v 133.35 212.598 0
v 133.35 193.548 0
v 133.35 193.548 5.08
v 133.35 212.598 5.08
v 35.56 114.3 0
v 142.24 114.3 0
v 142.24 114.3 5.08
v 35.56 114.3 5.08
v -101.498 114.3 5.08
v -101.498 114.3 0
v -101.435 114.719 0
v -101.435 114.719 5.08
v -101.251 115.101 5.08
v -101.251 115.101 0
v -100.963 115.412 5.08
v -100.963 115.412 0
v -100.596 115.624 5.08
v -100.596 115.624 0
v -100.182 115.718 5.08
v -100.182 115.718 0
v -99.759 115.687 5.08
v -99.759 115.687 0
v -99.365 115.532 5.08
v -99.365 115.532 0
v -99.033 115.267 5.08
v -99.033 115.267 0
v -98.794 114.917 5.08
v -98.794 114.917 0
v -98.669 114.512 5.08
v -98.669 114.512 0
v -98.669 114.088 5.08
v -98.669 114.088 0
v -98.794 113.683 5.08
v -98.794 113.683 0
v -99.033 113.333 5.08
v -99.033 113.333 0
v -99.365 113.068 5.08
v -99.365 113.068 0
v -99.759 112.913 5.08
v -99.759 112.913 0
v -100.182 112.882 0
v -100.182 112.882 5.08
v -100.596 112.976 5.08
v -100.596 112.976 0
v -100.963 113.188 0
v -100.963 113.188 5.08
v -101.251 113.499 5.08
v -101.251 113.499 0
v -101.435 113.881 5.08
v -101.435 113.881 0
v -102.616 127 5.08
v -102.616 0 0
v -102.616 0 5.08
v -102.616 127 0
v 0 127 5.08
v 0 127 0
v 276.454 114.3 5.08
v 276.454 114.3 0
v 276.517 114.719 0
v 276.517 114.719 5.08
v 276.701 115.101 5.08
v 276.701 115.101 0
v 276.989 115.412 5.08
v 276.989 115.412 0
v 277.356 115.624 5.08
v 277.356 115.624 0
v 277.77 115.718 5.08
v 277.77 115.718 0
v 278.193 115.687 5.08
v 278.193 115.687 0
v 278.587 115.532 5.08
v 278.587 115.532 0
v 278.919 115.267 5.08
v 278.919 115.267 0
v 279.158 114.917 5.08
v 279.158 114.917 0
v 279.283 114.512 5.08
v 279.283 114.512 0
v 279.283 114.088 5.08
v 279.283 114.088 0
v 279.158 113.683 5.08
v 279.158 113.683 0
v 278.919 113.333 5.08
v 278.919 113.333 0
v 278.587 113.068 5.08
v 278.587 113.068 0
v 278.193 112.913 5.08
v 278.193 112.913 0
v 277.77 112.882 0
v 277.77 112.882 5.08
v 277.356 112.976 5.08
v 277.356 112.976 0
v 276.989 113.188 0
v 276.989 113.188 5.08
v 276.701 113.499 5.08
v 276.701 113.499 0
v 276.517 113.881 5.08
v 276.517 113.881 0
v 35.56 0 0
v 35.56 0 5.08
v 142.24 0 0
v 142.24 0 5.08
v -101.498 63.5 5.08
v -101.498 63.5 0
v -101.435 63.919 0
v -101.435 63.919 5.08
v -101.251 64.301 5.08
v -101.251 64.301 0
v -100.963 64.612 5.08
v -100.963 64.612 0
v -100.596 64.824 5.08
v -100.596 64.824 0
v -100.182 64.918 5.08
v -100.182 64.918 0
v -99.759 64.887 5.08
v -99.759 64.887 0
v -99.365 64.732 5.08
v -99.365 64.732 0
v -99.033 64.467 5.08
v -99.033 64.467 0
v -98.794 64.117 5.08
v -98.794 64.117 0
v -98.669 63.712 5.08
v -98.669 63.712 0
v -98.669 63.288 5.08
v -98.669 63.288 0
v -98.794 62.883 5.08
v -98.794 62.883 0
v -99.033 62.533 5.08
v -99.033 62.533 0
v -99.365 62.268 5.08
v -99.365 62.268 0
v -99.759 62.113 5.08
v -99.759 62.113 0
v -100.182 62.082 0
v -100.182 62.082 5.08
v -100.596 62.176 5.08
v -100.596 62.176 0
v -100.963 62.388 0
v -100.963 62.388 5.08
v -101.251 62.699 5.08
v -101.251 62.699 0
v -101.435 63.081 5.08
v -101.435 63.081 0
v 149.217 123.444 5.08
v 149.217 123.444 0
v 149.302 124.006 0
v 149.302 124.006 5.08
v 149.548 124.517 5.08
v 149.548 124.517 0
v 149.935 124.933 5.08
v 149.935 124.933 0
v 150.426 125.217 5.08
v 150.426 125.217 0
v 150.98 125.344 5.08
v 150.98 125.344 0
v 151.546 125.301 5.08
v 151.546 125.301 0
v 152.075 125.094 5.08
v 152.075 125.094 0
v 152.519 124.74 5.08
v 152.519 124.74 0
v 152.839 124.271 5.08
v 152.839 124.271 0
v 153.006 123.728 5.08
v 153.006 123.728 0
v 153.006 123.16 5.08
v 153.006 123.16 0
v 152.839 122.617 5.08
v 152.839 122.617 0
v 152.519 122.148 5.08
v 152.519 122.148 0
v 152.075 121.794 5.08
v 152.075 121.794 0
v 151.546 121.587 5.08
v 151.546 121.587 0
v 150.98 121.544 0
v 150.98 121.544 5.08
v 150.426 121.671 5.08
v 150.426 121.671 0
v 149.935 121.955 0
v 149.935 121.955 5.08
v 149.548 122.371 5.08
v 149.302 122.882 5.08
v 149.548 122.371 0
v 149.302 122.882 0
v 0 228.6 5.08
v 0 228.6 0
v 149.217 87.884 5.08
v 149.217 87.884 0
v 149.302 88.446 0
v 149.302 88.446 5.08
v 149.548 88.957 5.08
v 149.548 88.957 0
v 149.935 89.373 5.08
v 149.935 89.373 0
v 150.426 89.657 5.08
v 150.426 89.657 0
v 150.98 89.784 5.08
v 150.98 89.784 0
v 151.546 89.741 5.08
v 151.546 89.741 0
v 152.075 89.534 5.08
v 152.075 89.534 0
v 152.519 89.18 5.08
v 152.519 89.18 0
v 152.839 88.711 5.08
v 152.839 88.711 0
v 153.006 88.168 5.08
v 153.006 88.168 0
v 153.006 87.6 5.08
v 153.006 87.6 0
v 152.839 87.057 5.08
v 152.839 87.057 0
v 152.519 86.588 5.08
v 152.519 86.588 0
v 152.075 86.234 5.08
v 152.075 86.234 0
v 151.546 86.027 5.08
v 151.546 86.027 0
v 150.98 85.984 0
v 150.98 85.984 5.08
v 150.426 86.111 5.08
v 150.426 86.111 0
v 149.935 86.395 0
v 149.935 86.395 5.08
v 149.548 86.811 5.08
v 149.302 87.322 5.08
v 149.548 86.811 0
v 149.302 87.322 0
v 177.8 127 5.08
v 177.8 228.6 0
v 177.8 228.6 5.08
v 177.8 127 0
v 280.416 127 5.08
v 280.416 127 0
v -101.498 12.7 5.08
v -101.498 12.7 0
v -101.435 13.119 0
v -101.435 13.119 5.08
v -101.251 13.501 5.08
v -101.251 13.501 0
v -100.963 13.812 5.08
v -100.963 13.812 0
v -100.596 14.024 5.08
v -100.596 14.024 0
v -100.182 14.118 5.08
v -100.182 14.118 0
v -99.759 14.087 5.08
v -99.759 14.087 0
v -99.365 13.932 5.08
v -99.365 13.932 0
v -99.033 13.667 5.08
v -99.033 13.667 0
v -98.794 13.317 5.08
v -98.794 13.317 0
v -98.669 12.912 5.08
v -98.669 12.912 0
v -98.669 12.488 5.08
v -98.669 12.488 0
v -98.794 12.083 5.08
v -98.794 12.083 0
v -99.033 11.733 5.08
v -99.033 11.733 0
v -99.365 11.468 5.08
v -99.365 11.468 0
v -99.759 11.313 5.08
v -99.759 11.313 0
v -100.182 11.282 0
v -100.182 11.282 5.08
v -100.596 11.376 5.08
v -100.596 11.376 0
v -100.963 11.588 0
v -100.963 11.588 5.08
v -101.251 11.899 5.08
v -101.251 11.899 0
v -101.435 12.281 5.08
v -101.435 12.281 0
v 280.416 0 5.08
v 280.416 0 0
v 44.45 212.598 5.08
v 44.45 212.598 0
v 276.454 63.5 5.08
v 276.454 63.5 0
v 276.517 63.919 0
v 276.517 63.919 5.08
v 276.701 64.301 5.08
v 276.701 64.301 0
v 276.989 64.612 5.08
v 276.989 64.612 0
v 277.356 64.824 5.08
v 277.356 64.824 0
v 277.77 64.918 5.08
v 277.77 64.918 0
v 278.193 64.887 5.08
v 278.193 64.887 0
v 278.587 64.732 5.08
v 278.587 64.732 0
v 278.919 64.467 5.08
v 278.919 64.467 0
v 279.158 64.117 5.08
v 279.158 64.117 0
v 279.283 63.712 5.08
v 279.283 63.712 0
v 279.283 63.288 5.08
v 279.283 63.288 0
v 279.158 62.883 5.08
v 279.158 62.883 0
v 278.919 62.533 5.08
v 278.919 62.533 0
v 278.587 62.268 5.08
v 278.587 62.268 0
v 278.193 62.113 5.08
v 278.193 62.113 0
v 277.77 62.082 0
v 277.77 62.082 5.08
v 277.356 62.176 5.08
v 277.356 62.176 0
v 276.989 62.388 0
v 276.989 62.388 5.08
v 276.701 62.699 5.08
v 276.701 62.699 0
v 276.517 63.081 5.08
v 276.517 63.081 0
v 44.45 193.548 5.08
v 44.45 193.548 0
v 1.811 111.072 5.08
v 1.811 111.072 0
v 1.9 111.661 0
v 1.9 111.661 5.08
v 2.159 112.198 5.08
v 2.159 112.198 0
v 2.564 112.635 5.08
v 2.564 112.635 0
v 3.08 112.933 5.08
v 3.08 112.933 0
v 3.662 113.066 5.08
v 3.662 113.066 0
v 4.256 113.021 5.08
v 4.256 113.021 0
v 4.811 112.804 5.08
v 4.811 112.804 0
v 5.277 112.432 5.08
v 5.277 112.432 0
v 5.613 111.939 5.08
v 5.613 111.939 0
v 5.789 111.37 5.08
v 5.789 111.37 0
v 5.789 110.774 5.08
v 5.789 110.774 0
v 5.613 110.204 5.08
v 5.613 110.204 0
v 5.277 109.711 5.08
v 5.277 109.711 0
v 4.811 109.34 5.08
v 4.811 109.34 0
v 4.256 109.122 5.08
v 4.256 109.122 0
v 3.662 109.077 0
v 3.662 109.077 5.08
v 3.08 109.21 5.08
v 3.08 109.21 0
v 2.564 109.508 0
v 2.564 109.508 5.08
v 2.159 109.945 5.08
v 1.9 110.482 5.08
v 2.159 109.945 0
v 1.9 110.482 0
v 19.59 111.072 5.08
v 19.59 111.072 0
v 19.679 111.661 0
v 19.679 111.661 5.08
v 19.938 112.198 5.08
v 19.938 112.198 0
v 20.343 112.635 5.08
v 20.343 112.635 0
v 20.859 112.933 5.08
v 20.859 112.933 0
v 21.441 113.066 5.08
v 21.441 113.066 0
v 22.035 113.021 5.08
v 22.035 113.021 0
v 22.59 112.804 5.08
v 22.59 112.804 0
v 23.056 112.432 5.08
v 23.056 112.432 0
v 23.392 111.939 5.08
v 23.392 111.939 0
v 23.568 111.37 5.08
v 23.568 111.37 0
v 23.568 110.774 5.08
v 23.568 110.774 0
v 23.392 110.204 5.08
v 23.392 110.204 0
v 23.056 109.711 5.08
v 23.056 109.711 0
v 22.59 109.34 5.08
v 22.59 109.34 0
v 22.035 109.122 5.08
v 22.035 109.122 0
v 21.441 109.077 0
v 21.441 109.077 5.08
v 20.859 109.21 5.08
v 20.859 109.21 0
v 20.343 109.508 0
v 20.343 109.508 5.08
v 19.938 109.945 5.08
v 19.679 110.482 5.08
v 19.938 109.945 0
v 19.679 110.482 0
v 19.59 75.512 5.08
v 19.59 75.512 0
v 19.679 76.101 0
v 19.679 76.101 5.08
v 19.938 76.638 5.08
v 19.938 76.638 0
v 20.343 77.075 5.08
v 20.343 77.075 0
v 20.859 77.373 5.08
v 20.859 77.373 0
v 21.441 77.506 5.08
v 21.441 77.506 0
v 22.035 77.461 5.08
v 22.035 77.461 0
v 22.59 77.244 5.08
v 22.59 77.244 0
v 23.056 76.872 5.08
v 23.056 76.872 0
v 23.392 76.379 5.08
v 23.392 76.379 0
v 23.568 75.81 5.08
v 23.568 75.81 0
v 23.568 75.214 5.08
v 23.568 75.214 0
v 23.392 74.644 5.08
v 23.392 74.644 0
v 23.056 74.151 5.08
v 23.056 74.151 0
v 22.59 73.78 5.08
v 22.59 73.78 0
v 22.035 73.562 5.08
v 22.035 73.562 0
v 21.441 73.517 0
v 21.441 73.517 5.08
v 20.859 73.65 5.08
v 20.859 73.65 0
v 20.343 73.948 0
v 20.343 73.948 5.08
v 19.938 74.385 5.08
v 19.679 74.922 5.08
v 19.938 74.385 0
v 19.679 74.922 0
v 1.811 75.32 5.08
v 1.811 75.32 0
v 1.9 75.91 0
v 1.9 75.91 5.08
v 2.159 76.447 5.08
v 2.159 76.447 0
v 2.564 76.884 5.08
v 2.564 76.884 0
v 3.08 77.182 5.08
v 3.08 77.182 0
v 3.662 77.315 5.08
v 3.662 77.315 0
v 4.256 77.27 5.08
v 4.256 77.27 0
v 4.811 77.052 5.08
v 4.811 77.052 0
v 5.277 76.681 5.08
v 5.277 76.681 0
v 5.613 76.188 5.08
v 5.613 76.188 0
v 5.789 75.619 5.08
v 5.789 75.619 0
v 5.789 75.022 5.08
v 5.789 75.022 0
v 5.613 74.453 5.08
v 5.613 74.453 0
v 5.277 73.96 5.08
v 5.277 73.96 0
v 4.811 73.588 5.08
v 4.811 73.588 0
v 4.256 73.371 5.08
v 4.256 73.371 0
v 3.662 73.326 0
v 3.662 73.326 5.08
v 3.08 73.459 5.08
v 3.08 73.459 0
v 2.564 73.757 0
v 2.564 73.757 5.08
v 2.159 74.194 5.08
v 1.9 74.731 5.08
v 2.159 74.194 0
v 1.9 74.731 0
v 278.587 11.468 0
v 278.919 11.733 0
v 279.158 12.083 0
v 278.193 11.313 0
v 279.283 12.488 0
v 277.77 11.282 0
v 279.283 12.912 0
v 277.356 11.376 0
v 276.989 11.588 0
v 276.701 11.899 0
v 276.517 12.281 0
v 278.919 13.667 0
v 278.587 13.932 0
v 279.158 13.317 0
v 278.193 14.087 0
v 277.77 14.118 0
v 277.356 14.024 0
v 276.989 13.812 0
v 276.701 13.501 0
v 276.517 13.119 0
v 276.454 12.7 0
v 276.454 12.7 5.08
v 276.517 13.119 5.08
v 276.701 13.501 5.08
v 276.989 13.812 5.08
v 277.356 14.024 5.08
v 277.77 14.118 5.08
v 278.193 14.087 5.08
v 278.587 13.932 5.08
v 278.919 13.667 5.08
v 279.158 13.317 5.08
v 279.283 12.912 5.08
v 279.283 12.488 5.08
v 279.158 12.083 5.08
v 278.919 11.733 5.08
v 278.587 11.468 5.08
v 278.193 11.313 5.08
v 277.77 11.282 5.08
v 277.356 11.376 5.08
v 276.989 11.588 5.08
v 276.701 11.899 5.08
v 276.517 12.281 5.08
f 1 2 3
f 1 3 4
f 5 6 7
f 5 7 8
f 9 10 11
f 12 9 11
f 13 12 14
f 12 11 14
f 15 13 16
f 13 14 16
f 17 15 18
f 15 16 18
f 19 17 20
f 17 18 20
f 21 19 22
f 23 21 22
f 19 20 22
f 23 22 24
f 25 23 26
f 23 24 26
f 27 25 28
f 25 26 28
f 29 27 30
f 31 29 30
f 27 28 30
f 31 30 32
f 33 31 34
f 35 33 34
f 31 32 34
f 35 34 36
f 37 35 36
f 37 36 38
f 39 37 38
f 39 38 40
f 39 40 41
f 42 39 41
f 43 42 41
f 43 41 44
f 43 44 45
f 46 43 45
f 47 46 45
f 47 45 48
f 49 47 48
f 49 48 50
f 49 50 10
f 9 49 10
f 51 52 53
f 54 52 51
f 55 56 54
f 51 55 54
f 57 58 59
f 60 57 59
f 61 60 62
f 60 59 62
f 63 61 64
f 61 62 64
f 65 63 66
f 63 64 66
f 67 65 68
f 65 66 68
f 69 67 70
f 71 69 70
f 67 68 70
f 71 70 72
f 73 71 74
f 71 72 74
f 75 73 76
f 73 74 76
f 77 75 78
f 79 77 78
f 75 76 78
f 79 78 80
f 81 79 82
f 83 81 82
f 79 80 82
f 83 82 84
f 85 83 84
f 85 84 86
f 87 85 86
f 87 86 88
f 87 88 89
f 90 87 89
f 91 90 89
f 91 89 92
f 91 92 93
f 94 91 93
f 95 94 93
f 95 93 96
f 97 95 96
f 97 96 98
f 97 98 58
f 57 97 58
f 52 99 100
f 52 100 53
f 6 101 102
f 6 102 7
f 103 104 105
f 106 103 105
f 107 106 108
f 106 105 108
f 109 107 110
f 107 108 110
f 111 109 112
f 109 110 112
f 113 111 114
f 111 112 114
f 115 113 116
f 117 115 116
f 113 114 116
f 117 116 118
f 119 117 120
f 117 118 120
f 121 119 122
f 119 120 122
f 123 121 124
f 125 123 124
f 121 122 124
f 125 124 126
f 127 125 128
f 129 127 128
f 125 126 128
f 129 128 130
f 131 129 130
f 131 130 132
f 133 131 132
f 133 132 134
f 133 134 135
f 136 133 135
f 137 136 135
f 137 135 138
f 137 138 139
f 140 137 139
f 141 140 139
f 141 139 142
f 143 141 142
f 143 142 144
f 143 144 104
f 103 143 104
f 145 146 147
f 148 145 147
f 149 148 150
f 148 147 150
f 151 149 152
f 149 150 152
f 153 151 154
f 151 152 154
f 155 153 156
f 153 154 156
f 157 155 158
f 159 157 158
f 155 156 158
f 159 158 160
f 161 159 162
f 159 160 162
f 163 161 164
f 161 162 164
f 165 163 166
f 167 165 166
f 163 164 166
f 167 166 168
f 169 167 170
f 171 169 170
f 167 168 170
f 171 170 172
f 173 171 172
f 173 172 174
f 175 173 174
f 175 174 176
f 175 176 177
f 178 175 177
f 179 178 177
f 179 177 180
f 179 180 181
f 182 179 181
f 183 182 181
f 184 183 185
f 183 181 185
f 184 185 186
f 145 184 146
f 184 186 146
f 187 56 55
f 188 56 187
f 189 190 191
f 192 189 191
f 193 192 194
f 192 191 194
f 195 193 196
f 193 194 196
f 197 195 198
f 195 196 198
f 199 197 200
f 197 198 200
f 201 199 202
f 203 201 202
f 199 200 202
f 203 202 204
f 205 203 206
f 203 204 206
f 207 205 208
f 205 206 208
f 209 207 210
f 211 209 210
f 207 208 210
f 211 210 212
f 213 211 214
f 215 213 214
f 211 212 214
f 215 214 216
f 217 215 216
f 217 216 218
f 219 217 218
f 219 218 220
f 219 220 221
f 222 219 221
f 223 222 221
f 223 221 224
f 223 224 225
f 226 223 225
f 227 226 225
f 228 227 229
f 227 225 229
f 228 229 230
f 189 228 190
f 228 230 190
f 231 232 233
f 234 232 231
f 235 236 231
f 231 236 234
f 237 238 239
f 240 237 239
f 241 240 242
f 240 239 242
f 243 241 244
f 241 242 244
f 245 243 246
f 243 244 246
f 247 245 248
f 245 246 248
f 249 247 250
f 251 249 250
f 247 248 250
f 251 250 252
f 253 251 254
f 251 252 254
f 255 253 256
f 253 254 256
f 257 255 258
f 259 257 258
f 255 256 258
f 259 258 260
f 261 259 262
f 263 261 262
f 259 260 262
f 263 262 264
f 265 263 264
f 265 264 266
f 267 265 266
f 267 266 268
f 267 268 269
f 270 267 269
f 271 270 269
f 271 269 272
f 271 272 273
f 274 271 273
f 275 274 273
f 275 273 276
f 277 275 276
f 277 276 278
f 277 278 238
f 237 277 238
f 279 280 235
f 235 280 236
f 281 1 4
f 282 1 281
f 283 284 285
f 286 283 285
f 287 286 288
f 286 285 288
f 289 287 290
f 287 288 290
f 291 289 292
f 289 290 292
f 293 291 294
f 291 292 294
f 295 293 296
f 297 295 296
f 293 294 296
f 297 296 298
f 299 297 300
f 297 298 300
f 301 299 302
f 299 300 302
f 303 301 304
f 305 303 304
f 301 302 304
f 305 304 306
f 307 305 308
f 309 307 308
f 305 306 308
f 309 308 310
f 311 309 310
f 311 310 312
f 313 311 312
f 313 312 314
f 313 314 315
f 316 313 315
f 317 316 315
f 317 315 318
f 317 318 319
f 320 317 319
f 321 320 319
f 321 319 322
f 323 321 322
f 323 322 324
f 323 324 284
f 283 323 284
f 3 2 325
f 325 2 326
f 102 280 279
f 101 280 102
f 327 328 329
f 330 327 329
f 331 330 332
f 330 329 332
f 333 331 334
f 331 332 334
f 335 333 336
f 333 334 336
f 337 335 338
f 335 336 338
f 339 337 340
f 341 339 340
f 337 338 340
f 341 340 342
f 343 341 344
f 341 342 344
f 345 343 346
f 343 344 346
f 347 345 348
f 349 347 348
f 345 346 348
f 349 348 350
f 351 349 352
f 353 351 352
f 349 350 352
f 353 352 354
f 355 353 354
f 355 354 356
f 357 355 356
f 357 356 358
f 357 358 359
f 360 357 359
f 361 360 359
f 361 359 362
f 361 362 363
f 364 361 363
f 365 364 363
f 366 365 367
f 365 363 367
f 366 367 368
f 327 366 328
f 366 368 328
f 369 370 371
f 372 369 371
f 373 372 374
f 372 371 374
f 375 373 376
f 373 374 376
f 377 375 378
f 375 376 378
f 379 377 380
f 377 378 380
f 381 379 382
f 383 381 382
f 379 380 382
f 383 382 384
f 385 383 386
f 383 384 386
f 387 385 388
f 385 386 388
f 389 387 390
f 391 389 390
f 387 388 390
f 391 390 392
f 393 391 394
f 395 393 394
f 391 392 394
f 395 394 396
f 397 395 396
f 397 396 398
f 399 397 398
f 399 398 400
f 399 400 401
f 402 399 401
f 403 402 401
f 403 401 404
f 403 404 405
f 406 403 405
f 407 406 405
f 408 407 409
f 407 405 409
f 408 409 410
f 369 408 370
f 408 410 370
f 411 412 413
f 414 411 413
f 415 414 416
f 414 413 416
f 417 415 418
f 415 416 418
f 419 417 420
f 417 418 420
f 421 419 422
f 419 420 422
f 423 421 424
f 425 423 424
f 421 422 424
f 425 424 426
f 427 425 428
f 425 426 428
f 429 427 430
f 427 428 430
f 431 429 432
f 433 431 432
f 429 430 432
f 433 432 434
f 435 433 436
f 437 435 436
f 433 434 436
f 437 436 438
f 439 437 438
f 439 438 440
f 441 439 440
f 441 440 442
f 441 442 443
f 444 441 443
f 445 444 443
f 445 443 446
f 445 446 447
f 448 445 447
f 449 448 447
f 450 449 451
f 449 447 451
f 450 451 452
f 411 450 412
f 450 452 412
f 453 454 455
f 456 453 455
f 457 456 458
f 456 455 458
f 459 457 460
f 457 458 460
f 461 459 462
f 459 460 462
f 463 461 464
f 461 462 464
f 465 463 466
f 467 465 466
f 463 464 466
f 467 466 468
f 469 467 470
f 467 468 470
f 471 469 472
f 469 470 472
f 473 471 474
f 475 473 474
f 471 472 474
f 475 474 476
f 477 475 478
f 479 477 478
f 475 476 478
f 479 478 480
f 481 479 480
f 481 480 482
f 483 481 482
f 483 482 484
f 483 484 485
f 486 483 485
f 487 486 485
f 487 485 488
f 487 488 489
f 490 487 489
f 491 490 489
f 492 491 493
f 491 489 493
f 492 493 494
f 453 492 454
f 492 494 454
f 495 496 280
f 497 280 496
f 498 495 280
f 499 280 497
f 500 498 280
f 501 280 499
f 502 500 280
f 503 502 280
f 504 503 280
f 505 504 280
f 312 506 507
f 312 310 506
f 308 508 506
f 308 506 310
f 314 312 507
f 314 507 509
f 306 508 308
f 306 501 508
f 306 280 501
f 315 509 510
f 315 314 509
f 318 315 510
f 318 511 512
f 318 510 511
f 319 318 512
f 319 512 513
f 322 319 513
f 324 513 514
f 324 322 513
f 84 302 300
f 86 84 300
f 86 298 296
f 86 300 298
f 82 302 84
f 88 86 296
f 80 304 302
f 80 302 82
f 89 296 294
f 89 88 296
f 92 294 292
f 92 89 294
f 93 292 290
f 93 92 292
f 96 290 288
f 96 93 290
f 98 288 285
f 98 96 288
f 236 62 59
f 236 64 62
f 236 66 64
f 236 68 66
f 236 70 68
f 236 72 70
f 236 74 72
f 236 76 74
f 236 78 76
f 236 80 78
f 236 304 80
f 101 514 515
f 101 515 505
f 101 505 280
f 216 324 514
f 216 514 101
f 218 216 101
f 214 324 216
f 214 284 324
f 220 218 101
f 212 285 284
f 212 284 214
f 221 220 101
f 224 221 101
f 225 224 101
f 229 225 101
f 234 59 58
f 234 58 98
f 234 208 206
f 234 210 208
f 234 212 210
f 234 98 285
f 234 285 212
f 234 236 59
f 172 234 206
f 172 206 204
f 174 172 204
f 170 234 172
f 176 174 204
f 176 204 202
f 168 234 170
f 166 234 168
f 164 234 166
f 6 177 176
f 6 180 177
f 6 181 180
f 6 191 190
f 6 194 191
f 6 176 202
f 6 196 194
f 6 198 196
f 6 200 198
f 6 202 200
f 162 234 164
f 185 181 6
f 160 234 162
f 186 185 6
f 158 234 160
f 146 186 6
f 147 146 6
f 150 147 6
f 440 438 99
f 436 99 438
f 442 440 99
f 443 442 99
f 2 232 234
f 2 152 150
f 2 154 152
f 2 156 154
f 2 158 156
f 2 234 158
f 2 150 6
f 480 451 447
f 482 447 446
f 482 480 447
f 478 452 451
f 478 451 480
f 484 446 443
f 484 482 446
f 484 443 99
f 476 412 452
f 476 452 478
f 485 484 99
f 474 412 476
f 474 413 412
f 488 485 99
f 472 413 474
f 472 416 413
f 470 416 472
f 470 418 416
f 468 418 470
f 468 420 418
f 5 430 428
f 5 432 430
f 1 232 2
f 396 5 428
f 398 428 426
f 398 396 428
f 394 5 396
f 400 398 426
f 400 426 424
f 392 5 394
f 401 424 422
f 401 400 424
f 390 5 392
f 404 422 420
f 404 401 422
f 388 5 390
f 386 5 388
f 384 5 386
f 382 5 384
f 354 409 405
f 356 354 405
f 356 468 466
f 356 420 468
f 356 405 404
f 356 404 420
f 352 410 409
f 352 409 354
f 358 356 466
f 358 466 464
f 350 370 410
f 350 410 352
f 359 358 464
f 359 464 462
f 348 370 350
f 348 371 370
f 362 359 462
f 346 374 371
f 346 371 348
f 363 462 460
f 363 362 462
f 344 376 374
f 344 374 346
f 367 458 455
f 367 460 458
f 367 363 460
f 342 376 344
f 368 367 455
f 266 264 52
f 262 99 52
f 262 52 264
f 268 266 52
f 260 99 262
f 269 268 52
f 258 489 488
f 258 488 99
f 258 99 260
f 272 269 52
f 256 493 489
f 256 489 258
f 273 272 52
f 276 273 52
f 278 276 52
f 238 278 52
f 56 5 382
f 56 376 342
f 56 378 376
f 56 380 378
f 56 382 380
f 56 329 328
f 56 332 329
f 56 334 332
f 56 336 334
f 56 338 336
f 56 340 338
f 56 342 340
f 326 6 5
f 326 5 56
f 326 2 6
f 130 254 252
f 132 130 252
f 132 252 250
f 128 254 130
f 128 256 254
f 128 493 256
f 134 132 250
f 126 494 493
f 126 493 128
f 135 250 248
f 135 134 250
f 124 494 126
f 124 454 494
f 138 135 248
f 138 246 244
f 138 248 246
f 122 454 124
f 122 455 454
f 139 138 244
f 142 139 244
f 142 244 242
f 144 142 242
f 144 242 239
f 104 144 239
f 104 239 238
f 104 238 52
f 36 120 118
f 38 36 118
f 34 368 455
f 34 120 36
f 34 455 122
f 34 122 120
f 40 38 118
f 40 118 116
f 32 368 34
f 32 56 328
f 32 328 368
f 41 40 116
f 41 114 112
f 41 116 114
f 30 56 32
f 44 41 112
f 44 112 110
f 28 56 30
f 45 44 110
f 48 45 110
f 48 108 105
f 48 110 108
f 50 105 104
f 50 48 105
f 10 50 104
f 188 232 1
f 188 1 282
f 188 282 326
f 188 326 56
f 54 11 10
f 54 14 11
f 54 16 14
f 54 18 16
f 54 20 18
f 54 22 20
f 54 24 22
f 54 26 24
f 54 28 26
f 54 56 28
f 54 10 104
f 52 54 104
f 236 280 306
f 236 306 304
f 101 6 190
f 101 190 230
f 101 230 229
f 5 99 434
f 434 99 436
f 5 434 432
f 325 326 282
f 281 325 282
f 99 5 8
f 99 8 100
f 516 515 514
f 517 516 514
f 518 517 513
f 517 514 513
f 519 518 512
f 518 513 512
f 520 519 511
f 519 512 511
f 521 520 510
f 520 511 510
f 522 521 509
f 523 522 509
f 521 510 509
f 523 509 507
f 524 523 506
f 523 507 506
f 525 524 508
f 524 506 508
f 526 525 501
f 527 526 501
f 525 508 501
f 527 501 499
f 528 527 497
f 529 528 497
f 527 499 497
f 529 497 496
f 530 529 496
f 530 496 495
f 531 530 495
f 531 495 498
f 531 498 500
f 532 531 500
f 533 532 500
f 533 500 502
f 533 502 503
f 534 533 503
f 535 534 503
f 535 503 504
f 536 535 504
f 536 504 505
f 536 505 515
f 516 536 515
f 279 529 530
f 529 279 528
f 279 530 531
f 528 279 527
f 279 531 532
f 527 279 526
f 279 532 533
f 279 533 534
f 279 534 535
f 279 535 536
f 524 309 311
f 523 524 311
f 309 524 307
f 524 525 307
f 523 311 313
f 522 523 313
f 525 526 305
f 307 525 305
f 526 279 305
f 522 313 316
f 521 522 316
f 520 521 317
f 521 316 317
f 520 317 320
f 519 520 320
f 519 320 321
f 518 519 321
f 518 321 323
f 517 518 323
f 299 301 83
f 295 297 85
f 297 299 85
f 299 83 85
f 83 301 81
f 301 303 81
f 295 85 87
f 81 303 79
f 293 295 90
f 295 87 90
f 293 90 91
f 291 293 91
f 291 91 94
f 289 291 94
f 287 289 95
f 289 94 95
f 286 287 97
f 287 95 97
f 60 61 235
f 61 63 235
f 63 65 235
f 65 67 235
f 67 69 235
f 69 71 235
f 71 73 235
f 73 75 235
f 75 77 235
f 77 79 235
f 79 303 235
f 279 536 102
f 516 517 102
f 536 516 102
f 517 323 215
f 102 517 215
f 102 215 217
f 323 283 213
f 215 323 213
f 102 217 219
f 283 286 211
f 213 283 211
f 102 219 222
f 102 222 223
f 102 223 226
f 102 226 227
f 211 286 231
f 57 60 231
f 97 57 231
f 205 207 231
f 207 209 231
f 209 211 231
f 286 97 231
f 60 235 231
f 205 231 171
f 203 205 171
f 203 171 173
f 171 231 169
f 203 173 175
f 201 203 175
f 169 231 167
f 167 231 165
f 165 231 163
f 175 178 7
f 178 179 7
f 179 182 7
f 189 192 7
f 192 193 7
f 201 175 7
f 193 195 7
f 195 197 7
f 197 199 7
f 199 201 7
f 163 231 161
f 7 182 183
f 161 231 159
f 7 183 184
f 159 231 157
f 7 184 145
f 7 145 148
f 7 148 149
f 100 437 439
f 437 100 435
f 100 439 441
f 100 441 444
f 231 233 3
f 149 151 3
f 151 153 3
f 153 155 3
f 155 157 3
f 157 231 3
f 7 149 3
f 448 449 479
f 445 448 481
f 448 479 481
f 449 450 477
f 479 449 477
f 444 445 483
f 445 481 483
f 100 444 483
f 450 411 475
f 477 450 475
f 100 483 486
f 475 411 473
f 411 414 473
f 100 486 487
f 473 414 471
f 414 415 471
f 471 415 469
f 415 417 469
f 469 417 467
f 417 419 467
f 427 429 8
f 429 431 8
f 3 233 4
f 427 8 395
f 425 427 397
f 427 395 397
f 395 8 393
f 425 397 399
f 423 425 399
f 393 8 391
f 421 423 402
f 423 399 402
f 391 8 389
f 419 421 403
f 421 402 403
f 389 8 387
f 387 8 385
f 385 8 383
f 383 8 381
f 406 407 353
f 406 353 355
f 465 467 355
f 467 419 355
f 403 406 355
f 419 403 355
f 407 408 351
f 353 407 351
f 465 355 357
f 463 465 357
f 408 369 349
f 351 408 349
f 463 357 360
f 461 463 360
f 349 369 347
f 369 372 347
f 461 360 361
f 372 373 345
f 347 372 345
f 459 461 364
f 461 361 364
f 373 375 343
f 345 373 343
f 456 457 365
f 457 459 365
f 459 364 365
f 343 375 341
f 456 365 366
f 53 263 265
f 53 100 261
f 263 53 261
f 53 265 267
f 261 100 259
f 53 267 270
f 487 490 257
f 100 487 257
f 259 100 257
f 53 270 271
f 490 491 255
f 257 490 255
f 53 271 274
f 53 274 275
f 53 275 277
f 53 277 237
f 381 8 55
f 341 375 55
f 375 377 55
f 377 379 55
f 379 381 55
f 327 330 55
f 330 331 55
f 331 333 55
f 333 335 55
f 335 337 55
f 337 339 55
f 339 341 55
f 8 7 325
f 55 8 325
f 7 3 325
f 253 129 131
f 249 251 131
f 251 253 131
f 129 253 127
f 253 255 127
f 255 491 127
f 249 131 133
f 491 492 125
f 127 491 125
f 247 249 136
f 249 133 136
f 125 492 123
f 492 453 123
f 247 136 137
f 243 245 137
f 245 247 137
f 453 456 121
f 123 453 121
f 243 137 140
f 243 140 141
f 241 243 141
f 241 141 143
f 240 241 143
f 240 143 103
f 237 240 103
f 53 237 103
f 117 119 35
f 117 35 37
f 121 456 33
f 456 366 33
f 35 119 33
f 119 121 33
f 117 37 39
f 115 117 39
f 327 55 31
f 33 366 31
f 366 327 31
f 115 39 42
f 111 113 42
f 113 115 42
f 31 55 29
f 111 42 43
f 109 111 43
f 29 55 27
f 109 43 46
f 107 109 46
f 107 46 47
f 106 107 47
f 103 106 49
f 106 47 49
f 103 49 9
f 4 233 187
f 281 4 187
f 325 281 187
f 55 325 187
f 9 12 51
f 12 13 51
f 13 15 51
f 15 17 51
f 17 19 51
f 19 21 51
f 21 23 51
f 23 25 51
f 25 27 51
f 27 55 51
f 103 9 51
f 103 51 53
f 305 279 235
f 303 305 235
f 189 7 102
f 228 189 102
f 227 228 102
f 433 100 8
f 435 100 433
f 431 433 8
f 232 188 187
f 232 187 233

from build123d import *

# Parameters (mm, degrees)
BOSS_EXTRUDE1_DEPTH = 5.08
SKETCH2_R           = 2
CUT_EXTRUDE1_DEPTH  = 5.08
SKETCH3_R           = 1.905
CUT_EXTRUDE2_DEPTH  = 5.08
SKETCH4_W           = 102.616
SKETCH4_H           = 127
BOSS_EXTRUDE2_DEPTH = 5.08
SKETCH8_W           = 88.9
SKETCH8_H           = 19.05
CUT_EXTRUDE3_DEPTH  = 50.8
SKETCH9_R           = 1.4224
CUT_EXTRUDE4_DEPTH  = 10.16


with BuildPart() as part:
    # Sketch1 → Boss-Extrude1 (new body)
    with BuildSketch(Plane.XY):
        Polygon((0, 0), (0, 228.6), (177.8, 228.6), (177.8, 0), (142.24, 0), (142.24, 114.3), (35.56, 114.3), (35.56, 0), align=None)
    extrude(amount=BOSS_EXTRUDE1_DEPTH)

    # Sketch2 → Cut-Extrude1 (cut)
    with BuildSketch(Plane(origin=(0, 0, 0), x_dir=(-1, 0, 0), z_dir=(0, 0, -1))):
        with Locations((-21.59, 111.071616712)):
            Circle(SKETCH2_R)
        with Locations((-3.811028038, 111.071616712)):
            Circle(SKETCH2_R)
        with Locations((-21.59, 75.511616712)):
            Circle(SKETCH2_R)
        with Locations((-3.811028038, 75.320420507)):
            Circle(SKETCH2_R)
    extrude(amount=-CUT_EXTRUDE1_DEPTH, mode=Mode.SUBTRACT)

    # Sketch3 → Cut-Extrude2 (cut)
    with BuildSketch(Plane(origin=(0, 0, 0), x_dir=(-1, 0, 0), z_dir=(0, 0, -1))):
        with Locations((-151.12245979, 123.444)):
            Circle(SKETCH3_R)
        with Locations((-151.12245979, 87.884)):
            Circle(SKETCH3_R)
    extrude(amount=-CUT_EXTRUDE2_DEPTH, mode=Mode.SUBTRACT)

    # Sketch4 → Boss-Extrude2 (add)
    with BuildSketch(Plane(origin=(0, 0, 0), x_dir=(-1, 0, 0), z_dir=(0, 0, -1))):
        with Locations((51.308, 63.5)):
            Rectangle(SKETCH4_W, SKETCH4_H)
        with Locations((-229.108, 63.5)):
            Rectangle(SKETCH4_W, SKETCH4_H)
    extrude(amount=-BOSS_EXTRUDE2_DEPTH)

    # Sketch8 → Cut-Extrude3 (cut)
    with BuildSketch(Plane(origin=(0, 0, 0), x_dir=(-1, 0, 0), z_dir=(0, 0, -1))):
        with Locations((-88.9, 203.073)):
            Rectangle(SKETCH8_W, SKETCH8_H)
    extrude(amount=-CUT_EXTRUDE3_DEPTH, mode=Mode.SUBTRACT)

    # Sketch9 → Cut-Extrude4 (cut)
    with BuildSketch(Plane(origin=(0, 0, 0), x_dir=(-1, 0, 0), z_dir=(0, 0, -1))):
        with Locations((100.076, 12.7)):
            Circle(SKETCH9_R)
        with Locations((100.076, 63.5)):
            Circle(SKETCH9_R)
        with Locations((100.076, 114.3)):
            Circle(SKETCH9_R)
        with Locations((-277.876, 63.5)):
            Circle(SKETCH9_R)
        with Locations((-277.876, 114.3)):
            Circle(SKETCH9_R)
        with Locations((-277.876, 12.7)):
            Circle(SKETCH9_R)
    extrude(amount=-CUT_EXTRUDE4_DEPTH, mode=Mode.SUBTRACT)


solid = part.part
